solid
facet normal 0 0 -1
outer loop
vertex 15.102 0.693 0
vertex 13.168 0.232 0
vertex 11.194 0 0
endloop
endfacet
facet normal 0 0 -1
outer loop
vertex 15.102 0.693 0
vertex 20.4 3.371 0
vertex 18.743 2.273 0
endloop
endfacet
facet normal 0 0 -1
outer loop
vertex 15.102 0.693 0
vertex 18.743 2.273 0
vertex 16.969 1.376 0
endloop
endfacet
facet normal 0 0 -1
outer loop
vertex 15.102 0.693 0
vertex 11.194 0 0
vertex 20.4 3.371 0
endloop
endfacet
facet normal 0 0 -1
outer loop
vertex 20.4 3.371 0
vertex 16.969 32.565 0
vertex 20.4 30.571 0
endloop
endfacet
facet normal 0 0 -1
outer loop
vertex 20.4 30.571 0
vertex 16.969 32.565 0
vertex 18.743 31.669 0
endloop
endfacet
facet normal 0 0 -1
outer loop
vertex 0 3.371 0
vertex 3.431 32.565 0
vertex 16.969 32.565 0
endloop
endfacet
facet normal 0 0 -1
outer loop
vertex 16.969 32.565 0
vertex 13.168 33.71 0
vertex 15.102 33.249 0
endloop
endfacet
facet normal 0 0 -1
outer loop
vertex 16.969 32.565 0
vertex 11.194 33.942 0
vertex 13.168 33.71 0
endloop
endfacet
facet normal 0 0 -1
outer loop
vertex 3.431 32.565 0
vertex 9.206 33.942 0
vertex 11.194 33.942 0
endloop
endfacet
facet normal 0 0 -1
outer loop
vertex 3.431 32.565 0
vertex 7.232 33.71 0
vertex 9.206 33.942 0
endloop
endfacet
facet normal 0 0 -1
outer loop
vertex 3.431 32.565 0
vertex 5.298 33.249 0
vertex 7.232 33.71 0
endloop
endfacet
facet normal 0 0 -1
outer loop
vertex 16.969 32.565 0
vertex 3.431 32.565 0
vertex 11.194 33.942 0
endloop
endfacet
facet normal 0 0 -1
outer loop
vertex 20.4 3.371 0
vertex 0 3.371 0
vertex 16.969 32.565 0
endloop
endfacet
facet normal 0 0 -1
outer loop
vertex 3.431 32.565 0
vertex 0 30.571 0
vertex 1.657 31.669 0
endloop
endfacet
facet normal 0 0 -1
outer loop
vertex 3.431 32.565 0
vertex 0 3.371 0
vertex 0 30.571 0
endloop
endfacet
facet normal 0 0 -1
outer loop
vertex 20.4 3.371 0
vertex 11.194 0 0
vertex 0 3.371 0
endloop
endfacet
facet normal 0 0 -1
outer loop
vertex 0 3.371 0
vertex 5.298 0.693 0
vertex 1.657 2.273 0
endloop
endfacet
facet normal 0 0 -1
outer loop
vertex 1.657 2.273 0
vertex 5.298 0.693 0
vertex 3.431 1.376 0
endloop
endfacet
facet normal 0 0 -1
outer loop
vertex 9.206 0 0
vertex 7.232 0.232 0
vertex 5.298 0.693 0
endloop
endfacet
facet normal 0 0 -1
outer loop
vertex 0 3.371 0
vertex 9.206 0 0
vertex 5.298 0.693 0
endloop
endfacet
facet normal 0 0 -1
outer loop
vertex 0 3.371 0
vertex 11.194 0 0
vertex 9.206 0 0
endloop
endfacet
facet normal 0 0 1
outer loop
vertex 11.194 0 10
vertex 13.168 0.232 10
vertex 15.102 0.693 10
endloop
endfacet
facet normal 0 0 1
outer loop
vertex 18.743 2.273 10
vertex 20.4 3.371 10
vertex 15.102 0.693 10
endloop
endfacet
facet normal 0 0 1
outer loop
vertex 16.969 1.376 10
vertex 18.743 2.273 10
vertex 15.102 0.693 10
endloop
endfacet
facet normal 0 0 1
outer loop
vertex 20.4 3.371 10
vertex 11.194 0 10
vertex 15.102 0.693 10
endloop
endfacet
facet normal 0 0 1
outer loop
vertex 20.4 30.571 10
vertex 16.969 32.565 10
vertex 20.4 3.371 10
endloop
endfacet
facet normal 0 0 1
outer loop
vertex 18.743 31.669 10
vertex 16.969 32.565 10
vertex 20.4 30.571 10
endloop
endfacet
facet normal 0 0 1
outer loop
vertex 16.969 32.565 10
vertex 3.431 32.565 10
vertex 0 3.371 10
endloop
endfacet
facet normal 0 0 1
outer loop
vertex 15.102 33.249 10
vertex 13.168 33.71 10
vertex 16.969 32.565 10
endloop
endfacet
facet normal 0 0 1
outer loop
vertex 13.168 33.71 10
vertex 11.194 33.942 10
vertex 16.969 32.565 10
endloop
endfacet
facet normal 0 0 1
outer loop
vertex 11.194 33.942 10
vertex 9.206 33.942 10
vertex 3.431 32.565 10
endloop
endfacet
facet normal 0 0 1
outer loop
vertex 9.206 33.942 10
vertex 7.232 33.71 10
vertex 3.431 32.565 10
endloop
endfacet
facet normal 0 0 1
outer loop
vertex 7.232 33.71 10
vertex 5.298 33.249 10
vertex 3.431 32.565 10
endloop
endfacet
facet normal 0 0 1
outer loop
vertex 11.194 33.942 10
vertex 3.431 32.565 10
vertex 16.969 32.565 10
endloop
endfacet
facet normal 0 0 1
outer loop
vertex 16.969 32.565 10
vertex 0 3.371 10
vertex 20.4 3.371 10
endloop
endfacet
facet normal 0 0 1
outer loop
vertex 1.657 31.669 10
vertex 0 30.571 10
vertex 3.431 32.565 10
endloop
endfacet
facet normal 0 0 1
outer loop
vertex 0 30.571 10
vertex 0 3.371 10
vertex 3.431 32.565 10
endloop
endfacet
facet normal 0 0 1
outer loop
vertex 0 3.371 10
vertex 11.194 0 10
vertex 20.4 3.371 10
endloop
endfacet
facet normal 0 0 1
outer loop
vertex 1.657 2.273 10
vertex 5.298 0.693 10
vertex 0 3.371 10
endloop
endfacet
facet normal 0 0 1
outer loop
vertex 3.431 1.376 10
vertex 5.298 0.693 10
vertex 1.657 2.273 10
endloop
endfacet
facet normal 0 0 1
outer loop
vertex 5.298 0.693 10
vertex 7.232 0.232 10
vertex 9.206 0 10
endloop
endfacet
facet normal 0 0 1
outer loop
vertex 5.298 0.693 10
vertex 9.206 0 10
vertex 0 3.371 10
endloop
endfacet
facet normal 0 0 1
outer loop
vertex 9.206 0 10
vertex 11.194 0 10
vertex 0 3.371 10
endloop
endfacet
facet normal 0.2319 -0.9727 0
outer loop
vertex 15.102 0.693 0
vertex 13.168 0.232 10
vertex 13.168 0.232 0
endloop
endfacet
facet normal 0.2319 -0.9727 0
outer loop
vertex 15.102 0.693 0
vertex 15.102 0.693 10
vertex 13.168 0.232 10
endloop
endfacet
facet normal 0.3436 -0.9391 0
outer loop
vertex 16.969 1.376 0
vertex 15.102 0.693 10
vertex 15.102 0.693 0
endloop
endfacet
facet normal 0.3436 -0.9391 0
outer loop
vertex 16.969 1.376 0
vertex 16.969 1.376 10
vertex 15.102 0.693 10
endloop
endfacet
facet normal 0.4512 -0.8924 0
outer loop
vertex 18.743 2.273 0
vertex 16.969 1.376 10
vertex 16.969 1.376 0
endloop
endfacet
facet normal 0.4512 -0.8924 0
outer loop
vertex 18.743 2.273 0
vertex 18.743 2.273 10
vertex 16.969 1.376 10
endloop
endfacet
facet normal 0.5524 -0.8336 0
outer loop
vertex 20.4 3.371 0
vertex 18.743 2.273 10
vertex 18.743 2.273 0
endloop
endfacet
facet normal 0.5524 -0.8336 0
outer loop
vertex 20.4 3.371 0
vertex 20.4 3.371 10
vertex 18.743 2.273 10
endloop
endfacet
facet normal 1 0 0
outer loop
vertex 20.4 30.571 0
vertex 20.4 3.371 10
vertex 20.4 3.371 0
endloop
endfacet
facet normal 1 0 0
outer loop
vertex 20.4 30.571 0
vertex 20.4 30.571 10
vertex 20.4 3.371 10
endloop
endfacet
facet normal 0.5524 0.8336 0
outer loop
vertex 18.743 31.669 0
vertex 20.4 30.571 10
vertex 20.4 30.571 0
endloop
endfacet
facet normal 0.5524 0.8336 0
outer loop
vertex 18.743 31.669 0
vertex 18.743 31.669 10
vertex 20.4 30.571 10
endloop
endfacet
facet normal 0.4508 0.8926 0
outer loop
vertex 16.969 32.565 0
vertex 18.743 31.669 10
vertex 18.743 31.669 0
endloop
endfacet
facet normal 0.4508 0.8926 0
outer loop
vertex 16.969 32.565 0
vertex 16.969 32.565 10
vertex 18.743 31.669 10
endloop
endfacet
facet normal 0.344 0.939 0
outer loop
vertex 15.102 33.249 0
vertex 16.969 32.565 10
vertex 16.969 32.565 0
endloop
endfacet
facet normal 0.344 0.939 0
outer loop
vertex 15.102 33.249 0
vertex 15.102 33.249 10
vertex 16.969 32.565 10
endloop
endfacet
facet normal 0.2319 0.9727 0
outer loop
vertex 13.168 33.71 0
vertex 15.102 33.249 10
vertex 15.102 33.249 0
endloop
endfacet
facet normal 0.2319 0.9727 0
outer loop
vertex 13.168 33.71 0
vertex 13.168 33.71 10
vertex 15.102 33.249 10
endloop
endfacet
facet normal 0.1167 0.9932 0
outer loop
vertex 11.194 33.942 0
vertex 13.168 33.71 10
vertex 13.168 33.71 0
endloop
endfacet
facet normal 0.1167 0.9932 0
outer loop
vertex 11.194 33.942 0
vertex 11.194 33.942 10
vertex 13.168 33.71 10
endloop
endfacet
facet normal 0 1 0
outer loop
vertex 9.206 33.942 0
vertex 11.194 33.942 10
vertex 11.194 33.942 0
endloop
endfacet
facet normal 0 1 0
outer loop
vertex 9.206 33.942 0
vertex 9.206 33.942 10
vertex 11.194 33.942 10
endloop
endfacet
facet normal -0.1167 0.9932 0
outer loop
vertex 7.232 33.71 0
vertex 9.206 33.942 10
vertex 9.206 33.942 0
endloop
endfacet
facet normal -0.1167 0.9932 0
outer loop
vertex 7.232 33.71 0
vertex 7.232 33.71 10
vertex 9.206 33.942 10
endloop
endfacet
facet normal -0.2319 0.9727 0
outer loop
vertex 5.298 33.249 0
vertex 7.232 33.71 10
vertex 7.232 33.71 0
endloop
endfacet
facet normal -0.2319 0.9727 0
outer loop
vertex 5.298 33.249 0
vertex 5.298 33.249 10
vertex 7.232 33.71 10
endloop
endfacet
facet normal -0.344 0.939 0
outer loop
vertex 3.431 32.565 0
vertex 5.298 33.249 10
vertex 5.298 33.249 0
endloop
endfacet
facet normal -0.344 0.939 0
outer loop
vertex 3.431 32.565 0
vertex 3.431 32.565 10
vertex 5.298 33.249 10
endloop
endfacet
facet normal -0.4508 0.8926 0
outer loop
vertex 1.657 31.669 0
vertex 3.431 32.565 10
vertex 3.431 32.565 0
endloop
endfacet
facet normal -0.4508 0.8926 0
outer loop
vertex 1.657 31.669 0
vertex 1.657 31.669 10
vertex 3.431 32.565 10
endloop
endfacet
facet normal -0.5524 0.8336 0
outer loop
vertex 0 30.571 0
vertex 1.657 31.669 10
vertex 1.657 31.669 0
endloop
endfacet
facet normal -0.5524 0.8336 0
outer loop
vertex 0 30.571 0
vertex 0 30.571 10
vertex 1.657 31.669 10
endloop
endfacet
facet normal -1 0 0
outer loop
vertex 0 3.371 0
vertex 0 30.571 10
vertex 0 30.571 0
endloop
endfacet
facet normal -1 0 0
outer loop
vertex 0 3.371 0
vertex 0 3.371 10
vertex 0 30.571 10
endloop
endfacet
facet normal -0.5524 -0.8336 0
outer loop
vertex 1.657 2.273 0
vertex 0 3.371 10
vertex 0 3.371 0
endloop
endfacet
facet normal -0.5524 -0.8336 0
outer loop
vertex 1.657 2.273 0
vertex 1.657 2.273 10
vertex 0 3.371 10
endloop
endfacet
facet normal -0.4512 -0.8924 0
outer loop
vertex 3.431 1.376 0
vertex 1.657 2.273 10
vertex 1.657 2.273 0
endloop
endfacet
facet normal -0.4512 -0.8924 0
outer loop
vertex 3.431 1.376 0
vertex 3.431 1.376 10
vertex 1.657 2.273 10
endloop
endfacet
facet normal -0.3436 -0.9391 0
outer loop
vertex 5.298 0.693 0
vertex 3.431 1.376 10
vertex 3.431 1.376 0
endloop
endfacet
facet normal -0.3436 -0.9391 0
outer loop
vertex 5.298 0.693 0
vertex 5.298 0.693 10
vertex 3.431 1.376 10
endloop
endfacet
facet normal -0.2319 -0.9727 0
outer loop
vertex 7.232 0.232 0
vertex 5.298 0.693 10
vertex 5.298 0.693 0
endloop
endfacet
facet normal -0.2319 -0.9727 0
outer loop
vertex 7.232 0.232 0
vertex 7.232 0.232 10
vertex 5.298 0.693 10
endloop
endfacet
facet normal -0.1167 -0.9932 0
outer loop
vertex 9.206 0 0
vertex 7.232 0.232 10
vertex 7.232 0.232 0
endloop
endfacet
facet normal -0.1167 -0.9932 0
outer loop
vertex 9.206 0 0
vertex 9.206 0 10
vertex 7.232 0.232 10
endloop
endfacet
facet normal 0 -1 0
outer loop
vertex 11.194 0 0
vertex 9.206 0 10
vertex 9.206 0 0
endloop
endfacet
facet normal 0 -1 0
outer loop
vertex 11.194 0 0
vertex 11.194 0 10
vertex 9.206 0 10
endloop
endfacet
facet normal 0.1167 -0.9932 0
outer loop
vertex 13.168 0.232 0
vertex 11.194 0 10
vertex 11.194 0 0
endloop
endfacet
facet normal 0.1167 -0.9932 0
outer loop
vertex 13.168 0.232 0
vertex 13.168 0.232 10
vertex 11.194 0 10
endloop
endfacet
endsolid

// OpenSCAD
$fn = 32;

// ----------------------------------------------------------------------
// Eccentric disc: double_d, 10 mm thick
// ----------------------------------------------------------------------

// --- parameters (mm) ---
profile_height = 10;      // extrusion height
profile_points = 24;      // points of the closed outline

profile = [[20.4, 30.571], [18.743, 31.669], [16.969, 32.565], [15.102, 33.249], [13.168, 33.71], [11.194, 33.942], [9.206, 33.942], [7.232, 33.71], [5.298, 33.249], [3.431, 32.565], [1.657, 31.669], [0, 30.571], [0, 3.371], [1.657, 2.273], [3.431, 1.376], [5.298, 0.693], [7.232, 0.232], [9.206, 0], [11.194, 0], [13.168, 0.232], [15.102, 0.693], [16.969, 1.376], [18.743, 2.273], [20.4, 3.371]];  // single closed polygon, 24 points, counter clockwise

// --- the one profile operation ---
linear_extrude(height = profile_height) polygon(points = profile);
